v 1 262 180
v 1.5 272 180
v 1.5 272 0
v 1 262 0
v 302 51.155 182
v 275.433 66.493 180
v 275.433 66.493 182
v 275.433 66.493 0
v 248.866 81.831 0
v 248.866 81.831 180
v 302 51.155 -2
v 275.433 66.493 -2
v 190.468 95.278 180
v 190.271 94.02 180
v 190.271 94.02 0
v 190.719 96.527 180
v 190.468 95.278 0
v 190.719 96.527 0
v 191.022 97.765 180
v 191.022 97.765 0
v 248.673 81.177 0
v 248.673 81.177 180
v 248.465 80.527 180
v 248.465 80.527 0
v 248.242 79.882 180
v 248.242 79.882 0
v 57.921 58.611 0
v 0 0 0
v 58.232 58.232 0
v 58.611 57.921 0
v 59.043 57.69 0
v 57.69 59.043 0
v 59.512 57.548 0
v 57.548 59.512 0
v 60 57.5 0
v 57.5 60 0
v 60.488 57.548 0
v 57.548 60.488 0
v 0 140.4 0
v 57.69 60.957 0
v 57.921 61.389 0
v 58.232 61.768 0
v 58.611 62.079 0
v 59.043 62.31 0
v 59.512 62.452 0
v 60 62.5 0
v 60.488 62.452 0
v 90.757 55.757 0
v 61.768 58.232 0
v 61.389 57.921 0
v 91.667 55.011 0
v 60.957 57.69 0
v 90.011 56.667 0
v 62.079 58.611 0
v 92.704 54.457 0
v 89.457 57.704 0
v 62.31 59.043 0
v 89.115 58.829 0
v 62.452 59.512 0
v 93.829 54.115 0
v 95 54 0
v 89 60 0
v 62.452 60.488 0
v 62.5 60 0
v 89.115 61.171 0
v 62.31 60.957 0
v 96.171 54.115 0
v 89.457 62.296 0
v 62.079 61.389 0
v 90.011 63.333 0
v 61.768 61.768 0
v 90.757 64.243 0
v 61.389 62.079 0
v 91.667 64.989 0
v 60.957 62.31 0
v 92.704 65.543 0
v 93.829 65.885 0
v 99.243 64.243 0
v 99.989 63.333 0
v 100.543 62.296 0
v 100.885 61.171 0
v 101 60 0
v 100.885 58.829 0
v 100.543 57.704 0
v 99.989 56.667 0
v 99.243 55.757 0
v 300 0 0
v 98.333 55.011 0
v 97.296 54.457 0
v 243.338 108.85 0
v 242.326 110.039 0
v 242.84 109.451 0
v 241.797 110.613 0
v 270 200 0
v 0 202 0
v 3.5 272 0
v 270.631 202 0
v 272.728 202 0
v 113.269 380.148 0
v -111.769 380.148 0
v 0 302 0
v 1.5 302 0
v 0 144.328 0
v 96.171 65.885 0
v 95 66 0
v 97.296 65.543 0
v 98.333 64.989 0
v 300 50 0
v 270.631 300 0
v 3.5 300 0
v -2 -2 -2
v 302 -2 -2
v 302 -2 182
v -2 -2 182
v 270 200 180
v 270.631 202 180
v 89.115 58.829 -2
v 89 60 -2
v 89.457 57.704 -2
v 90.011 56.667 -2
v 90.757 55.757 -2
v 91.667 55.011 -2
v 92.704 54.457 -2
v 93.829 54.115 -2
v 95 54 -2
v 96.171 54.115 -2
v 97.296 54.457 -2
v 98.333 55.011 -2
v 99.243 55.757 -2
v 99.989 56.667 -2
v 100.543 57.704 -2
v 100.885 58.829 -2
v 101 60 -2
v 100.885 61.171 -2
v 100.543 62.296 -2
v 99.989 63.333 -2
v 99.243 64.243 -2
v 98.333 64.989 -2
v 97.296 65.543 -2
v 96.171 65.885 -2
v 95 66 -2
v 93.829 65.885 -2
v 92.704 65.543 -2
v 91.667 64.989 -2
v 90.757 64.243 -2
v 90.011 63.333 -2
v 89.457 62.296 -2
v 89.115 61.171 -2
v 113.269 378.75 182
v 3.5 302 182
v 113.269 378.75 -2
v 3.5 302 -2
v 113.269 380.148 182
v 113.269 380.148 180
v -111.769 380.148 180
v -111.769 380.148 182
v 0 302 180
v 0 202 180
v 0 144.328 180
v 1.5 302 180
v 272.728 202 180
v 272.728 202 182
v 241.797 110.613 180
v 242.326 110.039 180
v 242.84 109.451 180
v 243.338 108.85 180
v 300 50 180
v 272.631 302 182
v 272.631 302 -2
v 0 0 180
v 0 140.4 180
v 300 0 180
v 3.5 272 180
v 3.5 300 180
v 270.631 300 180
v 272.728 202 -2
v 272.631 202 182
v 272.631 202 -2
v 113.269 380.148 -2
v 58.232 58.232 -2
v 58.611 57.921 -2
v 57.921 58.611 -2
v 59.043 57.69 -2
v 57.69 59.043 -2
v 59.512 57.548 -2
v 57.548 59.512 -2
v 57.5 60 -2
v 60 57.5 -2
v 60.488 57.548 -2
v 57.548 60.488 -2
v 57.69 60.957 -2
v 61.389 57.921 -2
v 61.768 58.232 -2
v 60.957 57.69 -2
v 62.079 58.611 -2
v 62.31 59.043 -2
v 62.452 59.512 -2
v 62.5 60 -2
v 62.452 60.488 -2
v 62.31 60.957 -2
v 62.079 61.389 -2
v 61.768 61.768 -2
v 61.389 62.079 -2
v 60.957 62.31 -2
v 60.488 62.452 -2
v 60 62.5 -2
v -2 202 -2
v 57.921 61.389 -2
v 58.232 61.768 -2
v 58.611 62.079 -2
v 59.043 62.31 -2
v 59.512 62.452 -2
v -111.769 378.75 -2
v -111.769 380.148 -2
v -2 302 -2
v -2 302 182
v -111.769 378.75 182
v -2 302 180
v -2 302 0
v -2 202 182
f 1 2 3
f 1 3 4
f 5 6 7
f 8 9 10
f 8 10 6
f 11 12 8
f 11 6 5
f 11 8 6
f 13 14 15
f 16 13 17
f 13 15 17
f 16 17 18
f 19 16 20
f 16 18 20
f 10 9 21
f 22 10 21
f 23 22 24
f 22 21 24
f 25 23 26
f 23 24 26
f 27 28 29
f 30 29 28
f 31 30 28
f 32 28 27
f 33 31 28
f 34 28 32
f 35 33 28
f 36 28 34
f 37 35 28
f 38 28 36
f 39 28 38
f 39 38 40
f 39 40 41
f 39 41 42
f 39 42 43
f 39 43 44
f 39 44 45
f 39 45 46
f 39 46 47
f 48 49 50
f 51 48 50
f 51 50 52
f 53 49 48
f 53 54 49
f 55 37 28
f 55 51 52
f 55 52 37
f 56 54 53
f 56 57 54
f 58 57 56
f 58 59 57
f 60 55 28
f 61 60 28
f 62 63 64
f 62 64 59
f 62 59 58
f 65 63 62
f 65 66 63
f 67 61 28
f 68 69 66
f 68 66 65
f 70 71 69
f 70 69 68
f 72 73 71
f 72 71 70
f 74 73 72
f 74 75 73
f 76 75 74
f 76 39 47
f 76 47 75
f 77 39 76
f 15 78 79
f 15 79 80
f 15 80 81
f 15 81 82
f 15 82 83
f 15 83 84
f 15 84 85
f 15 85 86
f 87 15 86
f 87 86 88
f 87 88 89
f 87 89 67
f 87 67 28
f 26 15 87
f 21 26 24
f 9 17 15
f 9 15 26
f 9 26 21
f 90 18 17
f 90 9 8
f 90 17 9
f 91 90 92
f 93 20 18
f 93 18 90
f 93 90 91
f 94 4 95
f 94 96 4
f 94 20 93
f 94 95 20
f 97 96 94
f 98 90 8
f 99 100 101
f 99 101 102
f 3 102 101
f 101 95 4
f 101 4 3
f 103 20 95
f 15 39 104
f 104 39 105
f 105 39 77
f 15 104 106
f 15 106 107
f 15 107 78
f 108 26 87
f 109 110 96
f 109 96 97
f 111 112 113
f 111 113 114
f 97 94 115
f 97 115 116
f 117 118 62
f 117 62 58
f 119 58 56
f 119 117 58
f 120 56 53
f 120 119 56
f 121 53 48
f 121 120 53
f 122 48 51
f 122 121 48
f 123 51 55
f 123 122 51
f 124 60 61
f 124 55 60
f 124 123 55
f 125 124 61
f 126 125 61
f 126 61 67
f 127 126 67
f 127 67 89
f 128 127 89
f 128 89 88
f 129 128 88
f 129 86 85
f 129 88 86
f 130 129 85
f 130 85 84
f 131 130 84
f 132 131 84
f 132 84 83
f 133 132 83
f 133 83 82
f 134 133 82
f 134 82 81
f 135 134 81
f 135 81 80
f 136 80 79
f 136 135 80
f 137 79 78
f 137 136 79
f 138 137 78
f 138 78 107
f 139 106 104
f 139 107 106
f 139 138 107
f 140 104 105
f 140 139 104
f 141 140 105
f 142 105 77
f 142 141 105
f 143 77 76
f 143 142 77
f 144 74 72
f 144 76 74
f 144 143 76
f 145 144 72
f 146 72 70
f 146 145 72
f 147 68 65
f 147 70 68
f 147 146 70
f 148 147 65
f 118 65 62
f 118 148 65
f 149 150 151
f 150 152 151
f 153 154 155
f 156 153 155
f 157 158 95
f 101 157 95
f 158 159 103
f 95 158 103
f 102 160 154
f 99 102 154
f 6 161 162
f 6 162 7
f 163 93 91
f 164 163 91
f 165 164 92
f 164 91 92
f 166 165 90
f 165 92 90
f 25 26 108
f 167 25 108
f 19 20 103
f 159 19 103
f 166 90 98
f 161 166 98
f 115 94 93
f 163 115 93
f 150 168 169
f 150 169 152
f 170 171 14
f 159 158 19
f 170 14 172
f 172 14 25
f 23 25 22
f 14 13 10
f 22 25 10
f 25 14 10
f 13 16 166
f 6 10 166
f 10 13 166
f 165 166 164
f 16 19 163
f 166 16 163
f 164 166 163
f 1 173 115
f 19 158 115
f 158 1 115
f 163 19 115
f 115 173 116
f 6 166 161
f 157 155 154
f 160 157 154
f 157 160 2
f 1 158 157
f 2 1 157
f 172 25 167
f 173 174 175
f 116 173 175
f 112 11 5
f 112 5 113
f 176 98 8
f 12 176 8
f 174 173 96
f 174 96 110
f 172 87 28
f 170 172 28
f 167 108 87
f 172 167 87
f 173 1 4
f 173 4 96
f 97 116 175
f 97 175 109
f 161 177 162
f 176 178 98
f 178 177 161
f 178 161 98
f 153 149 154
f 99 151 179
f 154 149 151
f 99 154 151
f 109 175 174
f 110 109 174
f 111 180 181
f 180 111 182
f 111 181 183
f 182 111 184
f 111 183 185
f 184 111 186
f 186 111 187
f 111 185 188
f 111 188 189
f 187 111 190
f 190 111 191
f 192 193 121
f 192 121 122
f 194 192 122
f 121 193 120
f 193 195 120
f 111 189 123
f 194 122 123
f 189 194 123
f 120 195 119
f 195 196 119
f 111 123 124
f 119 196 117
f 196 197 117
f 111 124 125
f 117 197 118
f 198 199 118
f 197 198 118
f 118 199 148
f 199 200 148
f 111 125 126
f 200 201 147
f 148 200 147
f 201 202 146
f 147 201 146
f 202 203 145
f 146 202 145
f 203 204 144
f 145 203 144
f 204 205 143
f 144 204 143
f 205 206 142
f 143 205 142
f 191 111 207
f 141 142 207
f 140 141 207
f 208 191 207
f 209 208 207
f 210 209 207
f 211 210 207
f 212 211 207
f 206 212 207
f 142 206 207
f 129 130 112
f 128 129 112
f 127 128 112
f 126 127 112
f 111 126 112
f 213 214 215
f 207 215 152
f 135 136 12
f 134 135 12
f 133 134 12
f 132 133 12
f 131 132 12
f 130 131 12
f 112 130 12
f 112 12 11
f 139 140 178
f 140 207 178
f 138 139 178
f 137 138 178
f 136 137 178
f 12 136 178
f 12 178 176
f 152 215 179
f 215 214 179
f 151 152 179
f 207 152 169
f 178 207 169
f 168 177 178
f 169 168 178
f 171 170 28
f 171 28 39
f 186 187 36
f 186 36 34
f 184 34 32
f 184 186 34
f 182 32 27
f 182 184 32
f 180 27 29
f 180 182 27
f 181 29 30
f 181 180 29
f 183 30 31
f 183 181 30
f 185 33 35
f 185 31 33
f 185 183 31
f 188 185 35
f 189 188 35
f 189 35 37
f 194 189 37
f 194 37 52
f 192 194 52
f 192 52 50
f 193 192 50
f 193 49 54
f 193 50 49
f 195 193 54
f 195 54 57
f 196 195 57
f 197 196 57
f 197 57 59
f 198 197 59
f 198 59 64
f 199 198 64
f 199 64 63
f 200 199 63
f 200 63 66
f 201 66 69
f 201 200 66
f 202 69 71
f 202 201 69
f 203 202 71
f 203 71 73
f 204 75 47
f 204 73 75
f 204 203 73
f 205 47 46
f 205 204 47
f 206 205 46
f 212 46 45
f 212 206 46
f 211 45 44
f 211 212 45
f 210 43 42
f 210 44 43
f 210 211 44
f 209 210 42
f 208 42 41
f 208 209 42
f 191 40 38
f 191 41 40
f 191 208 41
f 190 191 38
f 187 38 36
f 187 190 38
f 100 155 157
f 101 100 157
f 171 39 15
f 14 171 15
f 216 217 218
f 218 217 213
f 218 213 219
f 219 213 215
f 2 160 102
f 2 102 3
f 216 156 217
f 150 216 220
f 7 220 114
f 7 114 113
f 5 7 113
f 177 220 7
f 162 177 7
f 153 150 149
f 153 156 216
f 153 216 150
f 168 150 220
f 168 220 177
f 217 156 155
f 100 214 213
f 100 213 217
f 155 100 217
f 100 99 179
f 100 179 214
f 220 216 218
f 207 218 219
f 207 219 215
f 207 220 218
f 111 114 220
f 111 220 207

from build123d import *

# Parameters (mm, degrees)
EXTRUDE_3_DEPTH          = 180
EXTRUDE_4_DEPTH          = 2
EXTRUDE_5_DEPTH          = 180
CUT_EXTRUDE_8_DEPTH      = 6
CUT_EXTRUDE_8_DEPTH_BACK = 14
SKETCH_10_R              = 2.5
SKETCH_10_R_2            = 6
CUT_EXTRUDE_9_DEPTH      = 180
SKETCH_11_W              = 274.631033311
SKETCH_11_H              = 184
SKETCH_11_W_2            = 270.631033311
SKETCH_11_H_2            = 180
EXTRUDE_1_DEPTH          = 100
EXTRUDE_6_REACH          = 466.254
EXTRUDE_7_DEPTH          = 180
EXTRUDE_8_DEPTH          = 2
EXTRUDE_9_REACH          = 520.498
SKETCH_15_W              = 267.131033311
SKETCH_15_H              = 2


with BuildPart() as part:
    # 草图1 → 凸台-拉伸3 (new body)
    with BuildSketch(Plane.XY):
        with BuildLine():
            Line((300, 0), (0, 0))
            Line((0, 0), (0, 200))
            Line((0, 200), (270, 200))
            Line((270, 200), (241.796905997, 110.612978654))
            ThreePointArc((241.796905997, 110.612978654), (242.584644274, 109.746742593), (243.337981207, 108.850427931))
            Line((243.337981207, 108.850427931), (272.728222629, 202))
            Line((272.728222629, 202), (-2, 202))
            Line((-2, 202), (-2, -2))
            Line((-2, -2), (302, -2))
            Line((302, -2), (302, 51.154700538))
            Line((302, 51.154700538), (248.866473036, 81.831356634))
            ThreePointArc((248.866473036, 81.831356634), (248.571049064, 80.851494363), (248.242374569, 79.882278975))
            Line((248.242374569, 79.882278975), (300, 50))
            Line((300, 50), (300, 0))
        make_face()
    extrude(amount=EXTRUDE_3_DEPTH)

    # 草图7 → 凸台-拉伸4 (add)
    with BuildSketch(Plane(origin=(0, 0, 0), x_dir=(-1, 0, 0), z_dir=(0, 0, -1))):
        Polygon((-272.728222629, 202), (-275.433236518, 66.493028586), (-302, 51.154700538), (-302, -2), (2, -2), (2, 202), align=None)
    extrude_4 = extrude(amount=EXTRUDE_4_DEPTH)

    # 镜向5: 凸台-拉伸4 across plane
    add(extrude_4.mirror(Plane.XY.offset(90)))

    # 草图8 → 凸台-拉伸5 (add)
    with BuildSketch(Plane.XY):
        with BuildLine():
            Line((191.022225211, 97.764571353), (0, 144.327661976))
            Line((0, 144.327661976), (0, 140.399780569))
            Line((0, 140.399780569), (190.270548779, 94.019916677))
            ThreePointArc((190.270548779, 94.019916677), (190.586734182, 95.904218314), (191.022225211, 97.764571353))
        make_face()
    extrude(amount=EXTRUDE_5_DEPTH)

    # 草图10 → 切除-拉伸8 (cut, two sides: drawn at the far end of the back side and taken through both)
    with BuildSketch(Plane.XY.offset(-CUT_EXTRUDE_8_DEPTH_BACK)):
        with Locations((60, 60)):
            Circle(SKETCH_10_R)
        with Locations((95, 60)):
            Circle(SKETCH_10_R_2)
    extrude(amount=CUT_EXTRUDE_8_DEPTH + CUT_EXTRUDE_8_DEPTH_BACK, mode=Mode.SUBTRACT)

    # 草图8<3> → 切除-拉伸9 (cut)
    with BuildSketch(Plane.XY):
        Polygon((0, 200), (270, 200), (270.631033311, 202), (0, 202), align=None)
    extrude(amount=CUT_EXTRUDE_9_DEPTH, mode=Mode.SUBTRACT)

    # 草图11 → 拉伸-薄壁1 (add)
    with BuildSketch(Plane(origin=(0, 202, 0), x_dir=(1, 0, 0), z_dir=(0, 1, 0))):
        with Locations((135.315516656, -90)):
            Rectangle(SKETCH_11_W, SKETCH_11_H)
        with Locations((135.315516656, -90)):
            Rectangle(SKETCH_11_W_2, SKETCH_11_H_2, mode=Mode.SUBTRACT)
    extrude(amount=EXTRUDE_1_DEPTH)

    # 草图12 → 凸台-拉伸6 (add, up to next)
    with BuildSketch(Plane(origin=(0, 0, 180), x_dir=(-1, 0, 0), z_dir=(0, 0, -1)), mode=Mode.PRIVATE) as extrude_6_sk1:
        Polygon((-1.5, 302), (-1.5, 272), (-1, 262), (-3.5, 272), (-3.5, 302), align=None)
    extrude_6_tool1 = extrude(extrude_6_sk1.sketch, amount=EXTRUDE_6_REACH, mode=Mode.PRIVATE) - part.part
    add(extrude_6_tool1.solids().sort_by_distance((2.428571, 284.380952, 180))[0])

    # 草图13 → 凸台-拉伸7 (add)
    with BuildSketch(Plane(origin=(0, 0, 180), x_dir=(-1, 0, 0), z_dir=(0, 0, -1))):
        Polygon((-1.5, 302), (-113.268775045, 380.148175953), (-113.268775045, 378.749785823), (-3.5, 302), align=None)
        Polygon((111.768775045, 378.749785823), (111.768775045, 380.148175953), (0, 302), (2, 302), align=None)
    extrude(amount=EXTRUDE_7_DEPTH)

    # 草图14 → 凸台-拉伸8 (add)
    with BuildSketch(Plane(origin=(0, 0, 0), x_dir=(-1, 0, 0), z_dir=(0, 0, -1))):
        Polygon((-113.268775045, 380.148175953), (111.768775045, 380.148175953), (111.768775045, 378.749785823), (2, 302), (-3.5, 302), (-113.268775045, 378.749785823), align=None)
    extrude_8 = extrude(amount=EXTRUDE_8_DEPTH)

    # 镜向6: 凸台-拉伸8 across plane
    add(extrude_8.mirror(Plane.XY.offset(90)))

    # 草图15 → 凸台-拉伸9 (add, up to next)
    with BuildSketch(Plane(origin=(0, 0, 180), x_dir=(-1, 0, 0), z_dir=(0, 0, -1)), mode=Mode.PRIVATE) as extrude_9_sk1:
        with Locations((-137.065516656, 301)):
            Rectangle(SKETCH_15_W, SKETCH_15_H)
    extrude_9_tool1 = extrude(extrude_9_sk1.sketch, amount=EXTRUDE_9_REACH, mode=Mode.PRIVATE) - part.part
    add(extrude_9_tool1.solids().sort_by_distance((137.065517, 301, 180))[0])


solid = part.part
